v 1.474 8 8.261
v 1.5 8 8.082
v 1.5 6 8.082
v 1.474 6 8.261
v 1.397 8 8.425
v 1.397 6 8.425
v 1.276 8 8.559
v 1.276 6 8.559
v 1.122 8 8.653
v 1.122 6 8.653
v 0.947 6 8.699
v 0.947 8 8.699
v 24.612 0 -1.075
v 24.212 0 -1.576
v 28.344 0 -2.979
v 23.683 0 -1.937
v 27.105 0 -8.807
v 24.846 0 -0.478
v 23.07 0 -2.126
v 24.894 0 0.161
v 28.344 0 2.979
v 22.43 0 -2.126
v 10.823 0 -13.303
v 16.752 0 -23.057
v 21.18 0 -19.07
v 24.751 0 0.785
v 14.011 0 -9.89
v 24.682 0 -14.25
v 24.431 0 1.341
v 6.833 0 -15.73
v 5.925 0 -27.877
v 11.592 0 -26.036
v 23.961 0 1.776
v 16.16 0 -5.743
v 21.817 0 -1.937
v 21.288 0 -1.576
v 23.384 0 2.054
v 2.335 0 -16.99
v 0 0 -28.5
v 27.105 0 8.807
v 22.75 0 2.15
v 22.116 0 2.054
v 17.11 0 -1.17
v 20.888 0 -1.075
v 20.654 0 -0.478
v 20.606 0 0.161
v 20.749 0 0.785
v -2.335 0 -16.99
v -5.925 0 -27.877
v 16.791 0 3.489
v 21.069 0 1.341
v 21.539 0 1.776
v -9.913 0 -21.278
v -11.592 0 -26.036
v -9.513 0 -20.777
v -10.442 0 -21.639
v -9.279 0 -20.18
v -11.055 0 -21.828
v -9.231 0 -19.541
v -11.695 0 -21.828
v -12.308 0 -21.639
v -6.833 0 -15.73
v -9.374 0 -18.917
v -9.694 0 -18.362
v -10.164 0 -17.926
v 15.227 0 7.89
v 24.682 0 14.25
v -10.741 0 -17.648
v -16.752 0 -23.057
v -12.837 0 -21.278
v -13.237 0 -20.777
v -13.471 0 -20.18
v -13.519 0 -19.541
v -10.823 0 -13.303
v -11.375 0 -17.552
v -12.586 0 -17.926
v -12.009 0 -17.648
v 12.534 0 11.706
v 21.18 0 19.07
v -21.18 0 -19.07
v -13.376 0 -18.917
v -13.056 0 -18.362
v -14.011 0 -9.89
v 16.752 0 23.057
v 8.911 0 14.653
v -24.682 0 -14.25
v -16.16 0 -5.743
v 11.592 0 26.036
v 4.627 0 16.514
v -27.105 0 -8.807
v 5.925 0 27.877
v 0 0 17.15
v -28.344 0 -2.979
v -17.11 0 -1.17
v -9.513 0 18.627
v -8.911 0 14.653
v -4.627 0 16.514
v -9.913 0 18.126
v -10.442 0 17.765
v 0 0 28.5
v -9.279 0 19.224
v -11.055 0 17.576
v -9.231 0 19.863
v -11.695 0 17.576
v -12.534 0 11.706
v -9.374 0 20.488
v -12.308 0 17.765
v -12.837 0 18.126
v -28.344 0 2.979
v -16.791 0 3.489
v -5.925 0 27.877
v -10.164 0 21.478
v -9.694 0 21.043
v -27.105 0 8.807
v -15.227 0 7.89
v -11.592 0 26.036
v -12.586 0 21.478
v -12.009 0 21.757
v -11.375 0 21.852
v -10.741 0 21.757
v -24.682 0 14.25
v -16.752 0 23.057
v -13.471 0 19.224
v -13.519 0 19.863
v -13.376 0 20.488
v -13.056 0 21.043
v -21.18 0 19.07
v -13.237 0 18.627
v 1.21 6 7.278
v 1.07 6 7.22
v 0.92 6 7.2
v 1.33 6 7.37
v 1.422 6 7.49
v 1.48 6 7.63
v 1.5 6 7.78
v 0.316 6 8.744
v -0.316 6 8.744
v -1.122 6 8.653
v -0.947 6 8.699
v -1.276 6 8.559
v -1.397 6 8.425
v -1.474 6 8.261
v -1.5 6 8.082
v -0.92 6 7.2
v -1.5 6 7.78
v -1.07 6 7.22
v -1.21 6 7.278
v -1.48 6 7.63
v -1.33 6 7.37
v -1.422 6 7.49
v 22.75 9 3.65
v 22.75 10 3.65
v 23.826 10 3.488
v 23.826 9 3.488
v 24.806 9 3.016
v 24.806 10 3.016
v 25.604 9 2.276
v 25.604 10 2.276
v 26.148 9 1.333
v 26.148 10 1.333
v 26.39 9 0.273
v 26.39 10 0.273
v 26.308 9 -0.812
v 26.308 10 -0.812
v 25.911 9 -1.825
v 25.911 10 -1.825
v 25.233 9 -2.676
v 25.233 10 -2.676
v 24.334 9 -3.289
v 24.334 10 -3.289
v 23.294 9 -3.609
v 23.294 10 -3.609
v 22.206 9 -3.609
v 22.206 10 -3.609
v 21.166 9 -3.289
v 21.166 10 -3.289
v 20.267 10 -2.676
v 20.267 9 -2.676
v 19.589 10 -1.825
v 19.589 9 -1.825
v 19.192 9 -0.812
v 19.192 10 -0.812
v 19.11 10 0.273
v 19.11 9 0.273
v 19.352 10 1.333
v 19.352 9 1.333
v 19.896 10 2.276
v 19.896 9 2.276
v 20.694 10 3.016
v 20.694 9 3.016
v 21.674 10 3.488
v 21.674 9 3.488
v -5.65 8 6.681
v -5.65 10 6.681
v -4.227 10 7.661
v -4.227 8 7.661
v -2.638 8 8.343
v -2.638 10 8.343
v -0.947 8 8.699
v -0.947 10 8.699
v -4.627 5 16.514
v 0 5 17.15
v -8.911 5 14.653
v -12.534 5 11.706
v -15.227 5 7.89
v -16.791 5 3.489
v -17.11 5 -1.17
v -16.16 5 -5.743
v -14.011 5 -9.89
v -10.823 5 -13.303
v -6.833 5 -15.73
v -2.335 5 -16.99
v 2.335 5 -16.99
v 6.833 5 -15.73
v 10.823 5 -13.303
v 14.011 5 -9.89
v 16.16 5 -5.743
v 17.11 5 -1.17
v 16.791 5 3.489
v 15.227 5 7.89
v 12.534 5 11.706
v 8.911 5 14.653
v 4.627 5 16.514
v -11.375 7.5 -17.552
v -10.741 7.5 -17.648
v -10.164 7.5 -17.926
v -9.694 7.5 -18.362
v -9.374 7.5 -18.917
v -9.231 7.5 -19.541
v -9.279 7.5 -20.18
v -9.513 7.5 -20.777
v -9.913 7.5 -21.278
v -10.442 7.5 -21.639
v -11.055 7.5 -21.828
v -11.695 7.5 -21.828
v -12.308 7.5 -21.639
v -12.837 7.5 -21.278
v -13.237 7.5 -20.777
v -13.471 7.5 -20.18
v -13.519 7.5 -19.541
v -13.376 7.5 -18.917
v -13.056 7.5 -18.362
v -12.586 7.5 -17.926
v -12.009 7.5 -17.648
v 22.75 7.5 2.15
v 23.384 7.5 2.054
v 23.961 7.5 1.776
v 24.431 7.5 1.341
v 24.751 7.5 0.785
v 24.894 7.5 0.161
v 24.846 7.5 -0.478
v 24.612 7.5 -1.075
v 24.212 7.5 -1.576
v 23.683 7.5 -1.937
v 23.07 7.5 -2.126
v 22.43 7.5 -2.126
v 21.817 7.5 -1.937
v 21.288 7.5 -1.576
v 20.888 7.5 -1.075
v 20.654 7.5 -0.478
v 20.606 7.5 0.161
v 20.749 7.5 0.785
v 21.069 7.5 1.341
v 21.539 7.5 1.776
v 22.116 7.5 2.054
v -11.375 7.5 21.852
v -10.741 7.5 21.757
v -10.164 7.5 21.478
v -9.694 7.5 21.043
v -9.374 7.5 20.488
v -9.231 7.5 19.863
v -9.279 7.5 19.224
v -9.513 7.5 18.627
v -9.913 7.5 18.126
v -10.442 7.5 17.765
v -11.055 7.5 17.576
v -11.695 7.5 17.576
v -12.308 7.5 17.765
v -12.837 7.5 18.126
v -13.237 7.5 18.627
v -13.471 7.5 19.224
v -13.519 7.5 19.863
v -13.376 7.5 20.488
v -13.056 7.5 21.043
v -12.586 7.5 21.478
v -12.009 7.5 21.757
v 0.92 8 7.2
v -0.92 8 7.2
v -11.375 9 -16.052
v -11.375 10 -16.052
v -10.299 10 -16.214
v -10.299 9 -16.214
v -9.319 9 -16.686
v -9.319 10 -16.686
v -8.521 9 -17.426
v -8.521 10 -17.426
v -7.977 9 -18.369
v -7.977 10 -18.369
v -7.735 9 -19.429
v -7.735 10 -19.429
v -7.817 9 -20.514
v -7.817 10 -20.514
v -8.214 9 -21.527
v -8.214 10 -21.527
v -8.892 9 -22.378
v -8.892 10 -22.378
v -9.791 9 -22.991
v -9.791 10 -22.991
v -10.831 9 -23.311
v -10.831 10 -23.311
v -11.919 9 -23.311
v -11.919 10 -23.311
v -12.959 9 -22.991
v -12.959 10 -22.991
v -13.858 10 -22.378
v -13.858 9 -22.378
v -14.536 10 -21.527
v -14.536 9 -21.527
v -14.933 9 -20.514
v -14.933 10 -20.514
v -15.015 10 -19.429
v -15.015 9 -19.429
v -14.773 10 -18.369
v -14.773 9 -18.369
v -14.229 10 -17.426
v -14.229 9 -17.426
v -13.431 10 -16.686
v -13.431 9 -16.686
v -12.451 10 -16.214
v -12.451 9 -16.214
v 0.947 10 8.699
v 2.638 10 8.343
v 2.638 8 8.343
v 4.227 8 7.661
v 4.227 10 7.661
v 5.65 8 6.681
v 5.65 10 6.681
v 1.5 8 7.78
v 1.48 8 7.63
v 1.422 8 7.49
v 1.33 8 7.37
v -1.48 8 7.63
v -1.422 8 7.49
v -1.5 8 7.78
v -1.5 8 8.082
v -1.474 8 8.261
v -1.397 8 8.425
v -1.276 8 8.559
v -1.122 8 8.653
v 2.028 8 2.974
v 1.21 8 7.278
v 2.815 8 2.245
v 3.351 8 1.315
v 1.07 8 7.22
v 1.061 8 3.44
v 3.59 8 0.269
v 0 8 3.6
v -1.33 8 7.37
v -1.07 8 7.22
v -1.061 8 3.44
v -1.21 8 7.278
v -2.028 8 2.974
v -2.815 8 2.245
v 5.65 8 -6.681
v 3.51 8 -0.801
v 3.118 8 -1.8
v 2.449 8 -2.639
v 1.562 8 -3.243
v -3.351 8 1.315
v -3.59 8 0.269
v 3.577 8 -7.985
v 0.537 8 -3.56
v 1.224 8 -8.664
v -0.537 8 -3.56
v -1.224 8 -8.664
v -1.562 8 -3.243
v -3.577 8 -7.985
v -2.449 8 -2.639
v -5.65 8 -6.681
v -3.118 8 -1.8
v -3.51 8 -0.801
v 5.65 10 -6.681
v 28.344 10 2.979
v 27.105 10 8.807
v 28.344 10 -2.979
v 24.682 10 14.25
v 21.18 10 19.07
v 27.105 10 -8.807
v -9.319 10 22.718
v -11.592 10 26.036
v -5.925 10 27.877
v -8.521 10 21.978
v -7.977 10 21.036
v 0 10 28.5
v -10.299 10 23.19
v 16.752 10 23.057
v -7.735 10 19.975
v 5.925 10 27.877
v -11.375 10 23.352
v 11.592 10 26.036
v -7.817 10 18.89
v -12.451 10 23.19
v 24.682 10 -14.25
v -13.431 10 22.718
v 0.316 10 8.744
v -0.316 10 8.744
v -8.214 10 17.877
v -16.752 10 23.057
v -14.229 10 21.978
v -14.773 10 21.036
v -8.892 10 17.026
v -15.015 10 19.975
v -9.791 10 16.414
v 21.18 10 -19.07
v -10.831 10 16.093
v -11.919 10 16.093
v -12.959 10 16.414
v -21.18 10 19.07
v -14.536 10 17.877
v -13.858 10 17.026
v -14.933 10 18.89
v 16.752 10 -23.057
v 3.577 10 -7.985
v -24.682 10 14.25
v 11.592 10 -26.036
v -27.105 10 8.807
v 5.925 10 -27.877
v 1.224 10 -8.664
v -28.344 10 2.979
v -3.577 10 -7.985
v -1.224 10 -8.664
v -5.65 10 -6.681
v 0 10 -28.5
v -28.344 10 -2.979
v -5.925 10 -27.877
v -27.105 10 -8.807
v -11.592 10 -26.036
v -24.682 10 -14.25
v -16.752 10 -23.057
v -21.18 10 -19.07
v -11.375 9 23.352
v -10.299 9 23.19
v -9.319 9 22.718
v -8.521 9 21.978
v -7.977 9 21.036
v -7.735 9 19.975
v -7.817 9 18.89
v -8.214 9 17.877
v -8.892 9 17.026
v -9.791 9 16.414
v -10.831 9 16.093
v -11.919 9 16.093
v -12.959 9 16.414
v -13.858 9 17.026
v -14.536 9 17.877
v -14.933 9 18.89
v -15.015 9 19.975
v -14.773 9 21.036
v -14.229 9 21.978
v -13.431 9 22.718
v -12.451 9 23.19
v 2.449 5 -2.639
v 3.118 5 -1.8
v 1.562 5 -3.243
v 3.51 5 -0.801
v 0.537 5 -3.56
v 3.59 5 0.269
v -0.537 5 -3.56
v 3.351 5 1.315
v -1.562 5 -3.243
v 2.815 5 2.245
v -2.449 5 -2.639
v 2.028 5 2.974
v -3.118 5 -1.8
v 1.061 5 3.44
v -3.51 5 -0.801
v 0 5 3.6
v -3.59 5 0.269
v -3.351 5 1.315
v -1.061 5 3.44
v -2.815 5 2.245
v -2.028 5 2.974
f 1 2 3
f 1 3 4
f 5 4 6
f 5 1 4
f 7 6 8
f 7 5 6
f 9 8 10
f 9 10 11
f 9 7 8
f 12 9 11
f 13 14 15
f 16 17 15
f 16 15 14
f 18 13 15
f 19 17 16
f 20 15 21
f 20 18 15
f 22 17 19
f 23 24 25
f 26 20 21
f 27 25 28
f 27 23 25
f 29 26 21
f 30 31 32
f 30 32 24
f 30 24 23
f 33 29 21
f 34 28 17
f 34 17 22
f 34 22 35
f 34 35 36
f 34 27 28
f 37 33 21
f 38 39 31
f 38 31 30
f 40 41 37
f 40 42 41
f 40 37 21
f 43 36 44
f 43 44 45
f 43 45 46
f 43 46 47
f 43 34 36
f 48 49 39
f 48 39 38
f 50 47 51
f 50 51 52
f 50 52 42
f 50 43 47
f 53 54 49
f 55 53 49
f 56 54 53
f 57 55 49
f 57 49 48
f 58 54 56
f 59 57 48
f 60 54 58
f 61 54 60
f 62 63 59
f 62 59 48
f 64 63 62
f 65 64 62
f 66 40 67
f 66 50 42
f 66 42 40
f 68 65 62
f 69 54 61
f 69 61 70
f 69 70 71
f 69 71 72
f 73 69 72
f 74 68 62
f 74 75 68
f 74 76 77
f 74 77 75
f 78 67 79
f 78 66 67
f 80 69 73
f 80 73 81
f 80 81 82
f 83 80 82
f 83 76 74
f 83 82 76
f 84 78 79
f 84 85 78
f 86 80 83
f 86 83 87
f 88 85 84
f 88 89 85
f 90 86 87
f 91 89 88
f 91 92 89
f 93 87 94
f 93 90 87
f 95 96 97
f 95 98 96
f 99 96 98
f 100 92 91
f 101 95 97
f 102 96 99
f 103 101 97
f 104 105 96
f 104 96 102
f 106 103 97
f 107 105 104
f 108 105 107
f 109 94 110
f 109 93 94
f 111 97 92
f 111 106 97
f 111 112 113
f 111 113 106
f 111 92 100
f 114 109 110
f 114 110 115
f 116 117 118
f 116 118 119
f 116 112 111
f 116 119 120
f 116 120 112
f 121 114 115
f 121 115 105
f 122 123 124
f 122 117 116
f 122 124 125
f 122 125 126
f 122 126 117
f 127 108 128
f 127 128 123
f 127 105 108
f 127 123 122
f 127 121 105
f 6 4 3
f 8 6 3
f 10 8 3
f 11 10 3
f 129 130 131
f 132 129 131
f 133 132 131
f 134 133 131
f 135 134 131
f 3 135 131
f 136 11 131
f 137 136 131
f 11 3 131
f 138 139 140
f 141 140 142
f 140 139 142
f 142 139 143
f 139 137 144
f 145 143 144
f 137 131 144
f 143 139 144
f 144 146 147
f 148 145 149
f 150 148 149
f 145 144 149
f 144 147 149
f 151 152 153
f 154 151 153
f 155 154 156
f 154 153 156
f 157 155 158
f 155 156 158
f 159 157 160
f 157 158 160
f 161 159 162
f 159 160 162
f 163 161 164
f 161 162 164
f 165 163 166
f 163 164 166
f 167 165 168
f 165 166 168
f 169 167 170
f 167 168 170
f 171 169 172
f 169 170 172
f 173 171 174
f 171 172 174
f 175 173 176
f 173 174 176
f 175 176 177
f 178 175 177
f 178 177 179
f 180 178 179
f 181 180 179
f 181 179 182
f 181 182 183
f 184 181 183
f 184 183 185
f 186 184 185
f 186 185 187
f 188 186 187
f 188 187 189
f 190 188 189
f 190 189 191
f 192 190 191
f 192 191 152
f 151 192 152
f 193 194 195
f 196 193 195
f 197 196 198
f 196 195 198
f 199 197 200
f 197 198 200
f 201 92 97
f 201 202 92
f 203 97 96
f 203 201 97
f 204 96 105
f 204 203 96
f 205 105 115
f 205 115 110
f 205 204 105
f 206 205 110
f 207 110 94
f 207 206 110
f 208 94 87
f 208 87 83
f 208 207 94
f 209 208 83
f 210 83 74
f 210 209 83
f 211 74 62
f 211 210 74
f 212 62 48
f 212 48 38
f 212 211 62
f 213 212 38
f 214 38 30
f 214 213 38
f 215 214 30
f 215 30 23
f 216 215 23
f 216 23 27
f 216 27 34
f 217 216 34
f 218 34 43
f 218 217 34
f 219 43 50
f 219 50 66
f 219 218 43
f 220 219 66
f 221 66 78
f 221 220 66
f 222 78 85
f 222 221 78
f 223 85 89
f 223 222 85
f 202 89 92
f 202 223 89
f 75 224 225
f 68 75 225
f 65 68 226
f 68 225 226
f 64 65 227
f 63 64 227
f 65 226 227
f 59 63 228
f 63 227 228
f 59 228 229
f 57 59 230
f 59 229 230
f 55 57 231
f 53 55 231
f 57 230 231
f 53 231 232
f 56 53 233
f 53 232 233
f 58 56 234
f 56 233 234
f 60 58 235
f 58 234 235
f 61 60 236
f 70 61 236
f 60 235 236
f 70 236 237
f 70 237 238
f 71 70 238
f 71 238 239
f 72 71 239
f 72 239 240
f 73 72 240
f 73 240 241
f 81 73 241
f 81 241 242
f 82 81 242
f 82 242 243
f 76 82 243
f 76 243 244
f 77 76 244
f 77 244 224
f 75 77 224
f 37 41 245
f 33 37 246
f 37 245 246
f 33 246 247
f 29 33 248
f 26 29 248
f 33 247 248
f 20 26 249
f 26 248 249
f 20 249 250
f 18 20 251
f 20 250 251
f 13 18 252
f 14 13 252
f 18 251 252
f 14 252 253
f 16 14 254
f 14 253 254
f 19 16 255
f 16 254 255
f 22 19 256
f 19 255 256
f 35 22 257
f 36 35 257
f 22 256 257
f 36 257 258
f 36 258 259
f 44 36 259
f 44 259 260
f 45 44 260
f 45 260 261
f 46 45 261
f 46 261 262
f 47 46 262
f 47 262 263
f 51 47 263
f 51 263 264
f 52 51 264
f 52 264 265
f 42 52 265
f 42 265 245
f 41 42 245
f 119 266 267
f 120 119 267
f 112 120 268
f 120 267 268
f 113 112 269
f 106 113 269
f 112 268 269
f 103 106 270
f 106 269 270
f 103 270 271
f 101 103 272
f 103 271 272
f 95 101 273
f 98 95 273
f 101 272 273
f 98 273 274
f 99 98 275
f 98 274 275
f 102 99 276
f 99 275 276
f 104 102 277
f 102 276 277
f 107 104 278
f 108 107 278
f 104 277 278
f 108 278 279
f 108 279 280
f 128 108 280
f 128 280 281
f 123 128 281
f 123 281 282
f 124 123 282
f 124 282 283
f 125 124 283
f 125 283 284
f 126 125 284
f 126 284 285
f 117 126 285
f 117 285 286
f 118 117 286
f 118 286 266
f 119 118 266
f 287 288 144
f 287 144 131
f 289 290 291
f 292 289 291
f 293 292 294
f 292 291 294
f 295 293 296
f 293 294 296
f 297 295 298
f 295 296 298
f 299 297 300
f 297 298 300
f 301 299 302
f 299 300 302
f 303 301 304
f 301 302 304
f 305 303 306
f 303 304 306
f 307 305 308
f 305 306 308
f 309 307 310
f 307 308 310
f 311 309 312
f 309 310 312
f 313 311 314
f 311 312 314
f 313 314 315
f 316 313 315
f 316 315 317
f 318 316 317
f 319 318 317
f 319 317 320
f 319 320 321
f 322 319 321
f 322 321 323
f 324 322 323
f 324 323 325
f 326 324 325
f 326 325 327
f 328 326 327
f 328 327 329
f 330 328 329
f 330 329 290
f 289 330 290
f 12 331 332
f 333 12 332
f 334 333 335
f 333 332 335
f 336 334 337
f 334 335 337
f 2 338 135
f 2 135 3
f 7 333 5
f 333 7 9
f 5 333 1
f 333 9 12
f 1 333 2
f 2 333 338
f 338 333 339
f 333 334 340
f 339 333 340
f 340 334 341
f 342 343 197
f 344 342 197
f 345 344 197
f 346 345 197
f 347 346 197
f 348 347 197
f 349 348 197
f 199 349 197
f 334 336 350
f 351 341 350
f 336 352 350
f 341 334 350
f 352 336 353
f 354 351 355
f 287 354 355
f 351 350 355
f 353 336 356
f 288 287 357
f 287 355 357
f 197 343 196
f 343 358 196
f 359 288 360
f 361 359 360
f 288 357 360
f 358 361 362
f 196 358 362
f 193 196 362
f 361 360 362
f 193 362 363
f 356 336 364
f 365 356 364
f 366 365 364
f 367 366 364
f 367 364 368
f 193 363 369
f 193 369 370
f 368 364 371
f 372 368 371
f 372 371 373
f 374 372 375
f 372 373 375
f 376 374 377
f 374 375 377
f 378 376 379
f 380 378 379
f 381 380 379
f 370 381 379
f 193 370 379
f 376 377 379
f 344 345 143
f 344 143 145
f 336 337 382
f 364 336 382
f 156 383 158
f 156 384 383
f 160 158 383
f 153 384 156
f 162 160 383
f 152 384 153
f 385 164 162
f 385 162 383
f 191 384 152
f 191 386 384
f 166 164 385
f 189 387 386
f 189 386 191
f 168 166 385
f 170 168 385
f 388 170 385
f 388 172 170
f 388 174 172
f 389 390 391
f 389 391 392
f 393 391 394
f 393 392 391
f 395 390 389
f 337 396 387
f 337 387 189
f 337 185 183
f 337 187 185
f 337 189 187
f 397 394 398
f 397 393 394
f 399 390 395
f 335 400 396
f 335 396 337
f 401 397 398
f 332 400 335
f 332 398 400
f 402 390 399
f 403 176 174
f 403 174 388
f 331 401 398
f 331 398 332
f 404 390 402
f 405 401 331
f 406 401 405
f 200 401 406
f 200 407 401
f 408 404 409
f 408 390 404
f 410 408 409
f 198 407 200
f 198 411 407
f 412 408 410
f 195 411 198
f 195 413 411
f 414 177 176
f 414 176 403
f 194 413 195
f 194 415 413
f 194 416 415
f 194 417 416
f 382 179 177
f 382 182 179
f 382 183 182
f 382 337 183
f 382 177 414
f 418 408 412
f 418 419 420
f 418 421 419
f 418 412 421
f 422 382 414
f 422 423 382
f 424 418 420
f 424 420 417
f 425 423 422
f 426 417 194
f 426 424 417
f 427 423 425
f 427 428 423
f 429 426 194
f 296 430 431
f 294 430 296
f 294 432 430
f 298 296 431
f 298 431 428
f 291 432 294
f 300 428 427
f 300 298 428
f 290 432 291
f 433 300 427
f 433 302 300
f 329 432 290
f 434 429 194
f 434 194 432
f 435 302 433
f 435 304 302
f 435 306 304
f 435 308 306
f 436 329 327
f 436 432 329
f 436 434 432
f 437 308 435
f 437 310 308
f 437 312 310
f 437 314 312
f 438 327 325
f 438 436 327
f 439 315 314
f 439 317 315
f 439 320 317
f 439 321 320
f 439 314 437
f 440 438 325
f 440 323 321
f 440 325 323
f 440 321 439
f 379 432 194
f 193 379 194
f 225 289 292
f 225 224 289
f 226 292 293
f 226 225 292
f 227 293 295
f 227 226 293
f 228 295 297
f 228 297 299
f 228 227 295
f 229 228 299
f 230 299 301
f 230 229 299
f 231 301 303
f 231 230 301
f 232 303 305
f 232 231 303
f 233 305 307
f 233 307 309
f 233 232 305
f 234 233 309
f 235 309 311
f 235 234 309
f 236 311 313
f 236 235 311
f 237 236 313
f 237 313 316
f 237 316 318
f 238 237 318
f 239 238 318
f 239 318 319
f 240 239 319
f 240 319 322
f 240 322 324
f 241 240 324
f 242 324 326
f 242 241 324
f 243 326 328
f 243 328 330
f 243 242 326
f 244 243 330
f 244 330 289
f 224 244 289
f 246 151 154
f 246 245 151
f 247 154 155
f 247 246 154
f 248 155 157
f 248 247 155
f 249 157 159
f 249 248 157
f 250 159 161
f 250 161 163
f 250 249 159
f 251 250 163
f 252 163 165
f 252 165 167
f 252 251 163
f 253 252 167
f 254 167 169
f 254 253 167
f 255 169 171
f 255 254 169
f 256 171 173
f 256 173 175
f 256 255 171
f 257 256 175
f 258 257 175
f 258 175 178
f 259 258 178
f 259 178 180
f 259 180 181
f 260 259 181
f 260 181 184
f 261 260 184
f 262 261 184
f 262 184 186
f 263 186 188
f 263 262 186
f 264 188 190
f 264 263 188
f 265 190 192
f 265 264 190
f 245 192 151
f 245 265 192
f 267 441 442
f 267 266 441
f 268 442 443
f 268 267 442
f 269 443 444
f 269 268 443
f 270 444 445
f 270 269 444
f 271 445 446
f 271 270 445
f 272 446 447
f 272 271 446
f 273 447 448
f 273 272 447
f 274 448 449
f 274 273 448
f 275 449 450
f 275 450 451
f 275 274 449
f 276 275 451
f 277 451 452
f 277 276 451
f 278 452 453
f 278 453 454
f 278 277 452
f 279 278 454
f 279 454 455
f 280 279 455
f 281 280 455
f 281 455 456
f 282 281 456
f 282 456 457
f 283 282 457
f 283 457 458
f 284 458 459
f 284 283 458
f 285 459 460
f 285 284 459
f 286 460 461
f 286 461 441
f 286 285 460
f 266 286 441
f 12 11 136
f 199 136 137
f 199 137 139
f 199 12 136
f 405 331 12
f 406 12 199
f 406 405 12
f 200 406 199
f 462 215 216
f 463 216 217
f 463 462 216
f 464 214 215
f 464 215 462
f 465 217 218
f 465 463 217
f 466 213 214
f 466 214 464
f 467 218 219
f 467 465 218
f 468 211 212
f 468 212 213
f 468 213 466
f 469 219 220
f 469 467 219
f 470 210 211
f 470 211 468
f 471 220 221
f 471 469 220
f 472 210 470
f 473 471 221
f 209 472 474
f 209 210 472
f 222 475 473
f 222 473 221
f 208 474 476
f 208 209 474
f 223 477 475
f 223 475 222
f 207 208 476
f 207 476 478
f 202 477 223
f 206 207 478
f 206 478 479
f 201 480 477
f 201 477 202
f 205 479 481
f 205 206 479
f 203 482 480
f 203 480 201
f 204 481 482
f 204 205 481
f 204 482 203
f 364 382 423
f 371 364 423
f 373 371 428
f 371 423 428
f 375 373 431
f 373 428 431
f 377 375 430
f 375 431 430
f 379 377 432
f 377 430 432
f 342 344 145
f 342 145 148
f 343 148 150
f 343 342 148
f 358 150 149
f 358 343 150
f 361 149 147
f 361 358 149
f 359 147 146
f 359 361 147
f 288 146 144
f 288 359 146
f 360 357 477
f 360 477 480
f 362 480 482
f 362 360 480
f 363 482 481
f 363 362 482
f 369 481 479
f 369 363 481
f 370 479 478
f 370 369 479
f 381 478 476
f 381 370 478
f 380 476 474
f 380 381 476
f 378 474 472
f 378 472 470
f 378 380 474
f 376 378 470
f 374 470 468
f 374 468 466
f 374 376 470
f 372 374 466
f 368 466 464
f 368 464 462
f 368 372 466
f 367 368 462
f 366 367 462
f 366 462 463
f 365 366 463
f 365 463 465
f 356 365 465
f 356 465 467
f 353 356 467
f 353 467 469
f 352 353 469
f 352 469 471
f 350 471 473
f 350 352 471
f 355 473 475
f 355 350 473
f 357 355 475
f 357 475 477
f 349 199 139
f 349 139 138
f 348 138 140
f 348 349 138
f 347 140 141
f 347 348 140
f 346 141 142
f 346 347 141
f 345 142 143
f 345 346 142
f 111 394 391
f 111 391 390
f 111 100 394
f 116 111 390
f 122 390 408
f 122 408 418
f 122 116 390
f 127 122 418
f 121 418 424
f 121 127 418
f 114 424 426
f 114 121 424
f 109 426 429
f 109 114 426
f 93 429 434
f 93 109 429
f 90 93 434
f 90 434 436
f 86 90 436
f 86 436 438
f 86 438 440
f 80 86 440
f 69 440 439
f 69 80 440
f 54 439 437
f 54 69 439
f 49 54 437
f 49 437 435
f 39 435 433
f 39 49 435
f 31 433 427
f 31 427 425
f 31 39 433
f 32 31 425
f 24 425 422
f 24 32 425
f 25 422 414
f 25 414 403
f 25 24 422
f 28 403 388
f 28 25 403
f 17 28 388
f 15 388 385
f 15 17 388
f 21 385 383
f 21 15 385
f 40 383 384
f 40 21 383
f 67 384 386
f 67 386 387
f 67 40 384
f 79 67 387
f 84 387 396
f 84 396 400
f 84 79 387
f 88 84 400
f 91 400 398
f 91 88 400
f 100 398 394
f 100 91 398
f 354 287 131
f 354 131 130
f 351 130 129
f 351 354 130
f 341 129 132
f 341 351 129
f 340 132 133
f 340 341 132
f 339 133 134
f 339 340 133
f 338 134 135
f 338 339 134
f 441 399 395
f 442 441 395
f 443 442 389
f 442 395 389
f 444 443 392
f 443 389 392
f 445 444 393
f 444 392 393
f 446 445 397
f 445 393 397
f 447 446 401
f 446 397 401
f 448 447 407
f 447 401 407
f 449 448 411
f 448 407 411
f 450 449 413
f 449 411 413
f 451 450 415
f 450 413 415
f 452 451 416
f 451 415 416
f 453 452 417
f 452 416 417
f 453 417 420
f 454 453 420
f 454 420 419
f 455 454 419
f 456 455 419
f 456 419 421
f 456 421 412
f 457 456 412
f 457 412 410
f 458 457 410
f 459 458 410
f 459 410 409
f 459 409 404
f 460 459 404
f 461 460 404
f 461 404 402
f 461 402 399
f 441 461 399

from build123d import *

# Parameters (mm, degrees)
SKETCH_714_R           = 3.6
CUT_EXTRUDE_1503_DEPTH = 2
CUT_EXTRUDE_1558_DEPTH = 4
SKETCH_1765_R          = 2.15
CUT_EXTRUDE_2399_DEPTH = 42.527099586
SKETCH_3_5_R           = 3.65
CUT_EXTRUDE_2433_DEPTH = 0.5
CHAMFER_3010_SIZE      = 2


with BuildPart() as part:
    # Sketch 314 → Повернуть1 (revolve)
    with BuildSketch(Plane.XY, mode=Mode.PRIVATE) as revolve_1_sk:
        Polygon((3.6, 10), (28.5, 10), (28.5, 0), (17.15, 0), (17.15, 5), (3.6, 5), align=None)
    revolve(revolve_1_sk.sketch.rotate(Axis((0, 24.786794377, 0), (0, -1, 0)), 90), axis=Axis((0, 24.786794377, 0), (0, -1, 0)))

    # Sketch 714 → Cut-Extrude 1503 (cut)
    # profile 1 of 2: a face of its own
    with BuildSketch(Plane(origin=(0, 10, 0), x_dir=(1, 0, 0), z_dir=(0, 1, 0))):
        with BuildLine():
            ThreePointArc((-1.5, -7.78), (-1.330121933, -7.369878067), (-0.92, -7.2))
            Line((-0.92, -7.2), (0.92, -7.2))
            ThreePointArc((0.92, -7.2), (1.330121933, -7.369878067), (1.5, -7.78))
            Line((1.5, -7.78), (1.5, -8.082233602))
            ThreePointArc((1.5, -8.082233602), (1.341523495, -8.496233679), (0.947109471, -8.6985909))
            ThreePointArc((0.947109471, -8.6985909), (3.449320455, -8.041435717), (5.65, -6.681317235))
            Line((5.65, -6.681317235), (5.65, 6.681317235))
            ThreePointArc((5.65, 6.681317235), (0, 8.75), (-5.65, 6.681317235))
            Line((-5.65, 6.681317235), (-5.65, -6.681317235))
            ThreePointArc((-5.65, -6.681317235), (-3.449320455, -8.041435717), (-0.947109471, -8.6985909))
            ThreePointArc((-0.947109471, -8.6985909), (-1.341523495, -8.496233679), (-1.5, -8.082233602))
            Line((-1.5, -8.082233602), (-1.5, -7.78))
        make_face()
        with Locations(Location((0, 0, 0), (0, 0, 270))):
            Circle(SKETCH_714_R, mode=Mode.SUBTRACT)
    # profile 2 of 2: a face of its own
    with BuildSketch(Plane(origin=(0, 10, 0), x_dir=(1, 0, 0), z_dir=(0, 1, 0))):
        with BuildLine():
            ThreePointArc((-1.5, -7.78), (-1.330121933, -7.369878067), (-0.92, -7.2))
            Line((-0.92, -7.2), (0.92, -7.2))
            ThreePointArc((0.92, -7.2), (1.330121933, -7.369878067), (1.5, -7.78))
            Line((1.5, -7.78), (1.5, -8.082233602))
            ThreePointArc((1.5, -8.082233602), (1.341523495, -8.496233679), (0.947109471, -8.6985909))
            ThreePointArc((0.947109471, -8.6985909), (0, -8.75), (-0.947109471, -8.6985909))
            ThreePointArc((-0.947109471, -8.6985909), (-1.341523495, -8.496233679), (-1.5, -8.082233602))
            Line((-1.5, -8.082233602), (-1.5, -7.78))
        make_face()
    extrude(amount=-CUT_EXTRUDE_1503_DEPTH, mode=Mode.SUBTRACT)

    # Эскиз2<3> → Cut-Extrude 1558 (cut)
    with BuildSketch(Plane(origin=(0, 10, 0), x_dir=(1, 0, 0), z_dir=(0, 1, 0))):
        with BuildLine():
            ThreePointArc((-1.5, -7.78), (-1.330121933, -7.369878067), (-0.92, -7.2))
            Line((-0.92, -7.2), (0.92, -7.2))
            ThreePointArc((0.92, -7.2), (1.330121933, -7.369878067), (1.5, -7.78))
            Line((1.5, -7.78), (1.5, -8.082233602))
            ThreePointArc((1.5, -8.082233602), (1.341523495, -8.496233679), (0.947109471, -8.6985909))
            ThreePointArc((0.947109471, -8.6985909), (0, -8.75), (-0.947109471, -8.6985909))
            ThreePointArc((-0.947109471, -8.6985909), (-1.341523495, -8.496233679), (-1.5, -8.082233602))
            Line((-1.5, -8.082233602), (-1.5, -7.78))
        make_face()
    extrude(amount=-CUT_EXTRUDE_1558_DEPTH, mode=Mode.SUBTRACT)

    # Sketch 1765 → Cut-Extrude 2399 (cut, through all)
    with BuildSketch(Plane(origin=(0, 10, 0), x_dir=(1, 0, 0), z_dir=(0, 1, 0))):
        with Locations(Location((22.75, 0, 0), (0, 0, 270))):
            Circle(SKETCH_1765_R)
        with Locations(Location((-11.375, -19.702077936, 0), (0, 0, 270))):
            Circle(SKETCH_1765_R)
        with Locations(Location((-11.375, 19.702077936, 0), (0, 0, 270))):
            Circle(SKETCH_1765_R)
    extrude(amount=-CUT_EXTRUDE_2399_DEPTH, mode=Mode.SUBTRACT)

    # Эскиз3<5> → Cut-Extrude 2433 (cut)
    with BuildSketch(Plane(origin=(0, 10, 0), x_dir=(1, 0, 0), z_dir=(0, 1, 0))):
        with Locations(Location((22.75, 0, 0), (0, 0, 270))):
            Circle(SKETCH_3_5_R)
        with Locations(Location((-11.375, -19.702077936, 0), (0, 0, 270))):
            Circle(SKETCH_3_5_R)
        with Locations(Location((-11.375, 19.702077936, 0), (0, 0, 270))):
            Circle(SKETCH_3_5_R)
    extrude(amount=-CUT_EXTRUDE_2433_DEPTH, mode=Mode.SUBTRACT)

    # Chamfer 3010
    # the kernel refuses this chamfer: 2 mm, written as the material it takes off along each edge
    with BuildSketch(Plane(origin=(-11.375, 9.5, -19.702077936), x_dir=(0, 0, 1), z_dir=(-1, 0, 0))) as chamfer_3010_piece_1_section:
        Polygon((2.15 + CHAMFER_3010_SIZE, 0), (2.15, -CHAMFER_3010_SIZE), (2.15, 0), align=None)
    chamfer_3010_piece_1 = revolve(axis=Axis((-11.375, 9.5, -19.702077936), (0, 1, 0)), mode=Mode.PRIVATE)
    chamfer_3010_piece_1 = chamfer_3010_piece_1 & Plane(origin=(-11.375, 8.244810857, -19.702077936), x_dir=(0, 0, 1), z_dir=(0, 1, 0)) * Cylinder(3.65, 17, mode=Mode.PRIVATE)
    add(chamfer_3010_piece_1, mode=Mode.SUBTRACT)
    with BuildSketch(Plane(origin=(22.75, 9.5, 0), x_dir=(0, 0, 1), z_dir=(-1, 0, 0))) as chamfer_3010_piece_2_section:
        Polygon((2.15 + CHAMFER_3010_SIZE, 0), (2.15, -CHAMFER_3010_SIZE), (2.15, 0), align=None)
    chamfer_3010_piece_2 = revolve(axis=Axis((22.75, 9.5, 0), (0, 1, 0)), mode=Mode.PRIVATE)
    chamfer_3010_piece_2 = chamfer_3010_piece_2 & Plane(origin=(22.75, 8.244810857, 0), x_dir=(0, 0, 1), z_dir=(0, 1, 0)) * Cylinder(3.65, 17, mode=Mode.PRIVATE)
    add(chamfer_3010_piece_2, mode=Mode.SUBTRACT)
    with BuildSketch(Plane(origin=(-11.375, 9.5, 19.702077936), x_dir=(0, 0, 1), z_dir=(-1, 0, 0))) as chamfer_3010_piece_3_section:
        Polygon((2.15 + CHAMFER_3010_SIZE, 0), (2.15, -CHAMFER_3010_SIZE), (2.15, 0), align=None)
    chamfer_3010_piece_3 = revolve(axis=Axis((-11.375, 9.5, 19.702077936), (0, 1, 0)), mode=Mode.PRIVATE)
    chamfer_3010_piece_3 = chamfer_3010_piece_3 & Plane(origin=(-11.375, 8.244810857, 19.702077936), x_dir=(0, 0, 1), z_dir=(0, 1, 0)) * Cylinder(3.65, 17, mode=Mode.PRIVATE)
    add(chamfer_3010_piece_3, mode=Mode.SUBTRACT)


solid = part.part
